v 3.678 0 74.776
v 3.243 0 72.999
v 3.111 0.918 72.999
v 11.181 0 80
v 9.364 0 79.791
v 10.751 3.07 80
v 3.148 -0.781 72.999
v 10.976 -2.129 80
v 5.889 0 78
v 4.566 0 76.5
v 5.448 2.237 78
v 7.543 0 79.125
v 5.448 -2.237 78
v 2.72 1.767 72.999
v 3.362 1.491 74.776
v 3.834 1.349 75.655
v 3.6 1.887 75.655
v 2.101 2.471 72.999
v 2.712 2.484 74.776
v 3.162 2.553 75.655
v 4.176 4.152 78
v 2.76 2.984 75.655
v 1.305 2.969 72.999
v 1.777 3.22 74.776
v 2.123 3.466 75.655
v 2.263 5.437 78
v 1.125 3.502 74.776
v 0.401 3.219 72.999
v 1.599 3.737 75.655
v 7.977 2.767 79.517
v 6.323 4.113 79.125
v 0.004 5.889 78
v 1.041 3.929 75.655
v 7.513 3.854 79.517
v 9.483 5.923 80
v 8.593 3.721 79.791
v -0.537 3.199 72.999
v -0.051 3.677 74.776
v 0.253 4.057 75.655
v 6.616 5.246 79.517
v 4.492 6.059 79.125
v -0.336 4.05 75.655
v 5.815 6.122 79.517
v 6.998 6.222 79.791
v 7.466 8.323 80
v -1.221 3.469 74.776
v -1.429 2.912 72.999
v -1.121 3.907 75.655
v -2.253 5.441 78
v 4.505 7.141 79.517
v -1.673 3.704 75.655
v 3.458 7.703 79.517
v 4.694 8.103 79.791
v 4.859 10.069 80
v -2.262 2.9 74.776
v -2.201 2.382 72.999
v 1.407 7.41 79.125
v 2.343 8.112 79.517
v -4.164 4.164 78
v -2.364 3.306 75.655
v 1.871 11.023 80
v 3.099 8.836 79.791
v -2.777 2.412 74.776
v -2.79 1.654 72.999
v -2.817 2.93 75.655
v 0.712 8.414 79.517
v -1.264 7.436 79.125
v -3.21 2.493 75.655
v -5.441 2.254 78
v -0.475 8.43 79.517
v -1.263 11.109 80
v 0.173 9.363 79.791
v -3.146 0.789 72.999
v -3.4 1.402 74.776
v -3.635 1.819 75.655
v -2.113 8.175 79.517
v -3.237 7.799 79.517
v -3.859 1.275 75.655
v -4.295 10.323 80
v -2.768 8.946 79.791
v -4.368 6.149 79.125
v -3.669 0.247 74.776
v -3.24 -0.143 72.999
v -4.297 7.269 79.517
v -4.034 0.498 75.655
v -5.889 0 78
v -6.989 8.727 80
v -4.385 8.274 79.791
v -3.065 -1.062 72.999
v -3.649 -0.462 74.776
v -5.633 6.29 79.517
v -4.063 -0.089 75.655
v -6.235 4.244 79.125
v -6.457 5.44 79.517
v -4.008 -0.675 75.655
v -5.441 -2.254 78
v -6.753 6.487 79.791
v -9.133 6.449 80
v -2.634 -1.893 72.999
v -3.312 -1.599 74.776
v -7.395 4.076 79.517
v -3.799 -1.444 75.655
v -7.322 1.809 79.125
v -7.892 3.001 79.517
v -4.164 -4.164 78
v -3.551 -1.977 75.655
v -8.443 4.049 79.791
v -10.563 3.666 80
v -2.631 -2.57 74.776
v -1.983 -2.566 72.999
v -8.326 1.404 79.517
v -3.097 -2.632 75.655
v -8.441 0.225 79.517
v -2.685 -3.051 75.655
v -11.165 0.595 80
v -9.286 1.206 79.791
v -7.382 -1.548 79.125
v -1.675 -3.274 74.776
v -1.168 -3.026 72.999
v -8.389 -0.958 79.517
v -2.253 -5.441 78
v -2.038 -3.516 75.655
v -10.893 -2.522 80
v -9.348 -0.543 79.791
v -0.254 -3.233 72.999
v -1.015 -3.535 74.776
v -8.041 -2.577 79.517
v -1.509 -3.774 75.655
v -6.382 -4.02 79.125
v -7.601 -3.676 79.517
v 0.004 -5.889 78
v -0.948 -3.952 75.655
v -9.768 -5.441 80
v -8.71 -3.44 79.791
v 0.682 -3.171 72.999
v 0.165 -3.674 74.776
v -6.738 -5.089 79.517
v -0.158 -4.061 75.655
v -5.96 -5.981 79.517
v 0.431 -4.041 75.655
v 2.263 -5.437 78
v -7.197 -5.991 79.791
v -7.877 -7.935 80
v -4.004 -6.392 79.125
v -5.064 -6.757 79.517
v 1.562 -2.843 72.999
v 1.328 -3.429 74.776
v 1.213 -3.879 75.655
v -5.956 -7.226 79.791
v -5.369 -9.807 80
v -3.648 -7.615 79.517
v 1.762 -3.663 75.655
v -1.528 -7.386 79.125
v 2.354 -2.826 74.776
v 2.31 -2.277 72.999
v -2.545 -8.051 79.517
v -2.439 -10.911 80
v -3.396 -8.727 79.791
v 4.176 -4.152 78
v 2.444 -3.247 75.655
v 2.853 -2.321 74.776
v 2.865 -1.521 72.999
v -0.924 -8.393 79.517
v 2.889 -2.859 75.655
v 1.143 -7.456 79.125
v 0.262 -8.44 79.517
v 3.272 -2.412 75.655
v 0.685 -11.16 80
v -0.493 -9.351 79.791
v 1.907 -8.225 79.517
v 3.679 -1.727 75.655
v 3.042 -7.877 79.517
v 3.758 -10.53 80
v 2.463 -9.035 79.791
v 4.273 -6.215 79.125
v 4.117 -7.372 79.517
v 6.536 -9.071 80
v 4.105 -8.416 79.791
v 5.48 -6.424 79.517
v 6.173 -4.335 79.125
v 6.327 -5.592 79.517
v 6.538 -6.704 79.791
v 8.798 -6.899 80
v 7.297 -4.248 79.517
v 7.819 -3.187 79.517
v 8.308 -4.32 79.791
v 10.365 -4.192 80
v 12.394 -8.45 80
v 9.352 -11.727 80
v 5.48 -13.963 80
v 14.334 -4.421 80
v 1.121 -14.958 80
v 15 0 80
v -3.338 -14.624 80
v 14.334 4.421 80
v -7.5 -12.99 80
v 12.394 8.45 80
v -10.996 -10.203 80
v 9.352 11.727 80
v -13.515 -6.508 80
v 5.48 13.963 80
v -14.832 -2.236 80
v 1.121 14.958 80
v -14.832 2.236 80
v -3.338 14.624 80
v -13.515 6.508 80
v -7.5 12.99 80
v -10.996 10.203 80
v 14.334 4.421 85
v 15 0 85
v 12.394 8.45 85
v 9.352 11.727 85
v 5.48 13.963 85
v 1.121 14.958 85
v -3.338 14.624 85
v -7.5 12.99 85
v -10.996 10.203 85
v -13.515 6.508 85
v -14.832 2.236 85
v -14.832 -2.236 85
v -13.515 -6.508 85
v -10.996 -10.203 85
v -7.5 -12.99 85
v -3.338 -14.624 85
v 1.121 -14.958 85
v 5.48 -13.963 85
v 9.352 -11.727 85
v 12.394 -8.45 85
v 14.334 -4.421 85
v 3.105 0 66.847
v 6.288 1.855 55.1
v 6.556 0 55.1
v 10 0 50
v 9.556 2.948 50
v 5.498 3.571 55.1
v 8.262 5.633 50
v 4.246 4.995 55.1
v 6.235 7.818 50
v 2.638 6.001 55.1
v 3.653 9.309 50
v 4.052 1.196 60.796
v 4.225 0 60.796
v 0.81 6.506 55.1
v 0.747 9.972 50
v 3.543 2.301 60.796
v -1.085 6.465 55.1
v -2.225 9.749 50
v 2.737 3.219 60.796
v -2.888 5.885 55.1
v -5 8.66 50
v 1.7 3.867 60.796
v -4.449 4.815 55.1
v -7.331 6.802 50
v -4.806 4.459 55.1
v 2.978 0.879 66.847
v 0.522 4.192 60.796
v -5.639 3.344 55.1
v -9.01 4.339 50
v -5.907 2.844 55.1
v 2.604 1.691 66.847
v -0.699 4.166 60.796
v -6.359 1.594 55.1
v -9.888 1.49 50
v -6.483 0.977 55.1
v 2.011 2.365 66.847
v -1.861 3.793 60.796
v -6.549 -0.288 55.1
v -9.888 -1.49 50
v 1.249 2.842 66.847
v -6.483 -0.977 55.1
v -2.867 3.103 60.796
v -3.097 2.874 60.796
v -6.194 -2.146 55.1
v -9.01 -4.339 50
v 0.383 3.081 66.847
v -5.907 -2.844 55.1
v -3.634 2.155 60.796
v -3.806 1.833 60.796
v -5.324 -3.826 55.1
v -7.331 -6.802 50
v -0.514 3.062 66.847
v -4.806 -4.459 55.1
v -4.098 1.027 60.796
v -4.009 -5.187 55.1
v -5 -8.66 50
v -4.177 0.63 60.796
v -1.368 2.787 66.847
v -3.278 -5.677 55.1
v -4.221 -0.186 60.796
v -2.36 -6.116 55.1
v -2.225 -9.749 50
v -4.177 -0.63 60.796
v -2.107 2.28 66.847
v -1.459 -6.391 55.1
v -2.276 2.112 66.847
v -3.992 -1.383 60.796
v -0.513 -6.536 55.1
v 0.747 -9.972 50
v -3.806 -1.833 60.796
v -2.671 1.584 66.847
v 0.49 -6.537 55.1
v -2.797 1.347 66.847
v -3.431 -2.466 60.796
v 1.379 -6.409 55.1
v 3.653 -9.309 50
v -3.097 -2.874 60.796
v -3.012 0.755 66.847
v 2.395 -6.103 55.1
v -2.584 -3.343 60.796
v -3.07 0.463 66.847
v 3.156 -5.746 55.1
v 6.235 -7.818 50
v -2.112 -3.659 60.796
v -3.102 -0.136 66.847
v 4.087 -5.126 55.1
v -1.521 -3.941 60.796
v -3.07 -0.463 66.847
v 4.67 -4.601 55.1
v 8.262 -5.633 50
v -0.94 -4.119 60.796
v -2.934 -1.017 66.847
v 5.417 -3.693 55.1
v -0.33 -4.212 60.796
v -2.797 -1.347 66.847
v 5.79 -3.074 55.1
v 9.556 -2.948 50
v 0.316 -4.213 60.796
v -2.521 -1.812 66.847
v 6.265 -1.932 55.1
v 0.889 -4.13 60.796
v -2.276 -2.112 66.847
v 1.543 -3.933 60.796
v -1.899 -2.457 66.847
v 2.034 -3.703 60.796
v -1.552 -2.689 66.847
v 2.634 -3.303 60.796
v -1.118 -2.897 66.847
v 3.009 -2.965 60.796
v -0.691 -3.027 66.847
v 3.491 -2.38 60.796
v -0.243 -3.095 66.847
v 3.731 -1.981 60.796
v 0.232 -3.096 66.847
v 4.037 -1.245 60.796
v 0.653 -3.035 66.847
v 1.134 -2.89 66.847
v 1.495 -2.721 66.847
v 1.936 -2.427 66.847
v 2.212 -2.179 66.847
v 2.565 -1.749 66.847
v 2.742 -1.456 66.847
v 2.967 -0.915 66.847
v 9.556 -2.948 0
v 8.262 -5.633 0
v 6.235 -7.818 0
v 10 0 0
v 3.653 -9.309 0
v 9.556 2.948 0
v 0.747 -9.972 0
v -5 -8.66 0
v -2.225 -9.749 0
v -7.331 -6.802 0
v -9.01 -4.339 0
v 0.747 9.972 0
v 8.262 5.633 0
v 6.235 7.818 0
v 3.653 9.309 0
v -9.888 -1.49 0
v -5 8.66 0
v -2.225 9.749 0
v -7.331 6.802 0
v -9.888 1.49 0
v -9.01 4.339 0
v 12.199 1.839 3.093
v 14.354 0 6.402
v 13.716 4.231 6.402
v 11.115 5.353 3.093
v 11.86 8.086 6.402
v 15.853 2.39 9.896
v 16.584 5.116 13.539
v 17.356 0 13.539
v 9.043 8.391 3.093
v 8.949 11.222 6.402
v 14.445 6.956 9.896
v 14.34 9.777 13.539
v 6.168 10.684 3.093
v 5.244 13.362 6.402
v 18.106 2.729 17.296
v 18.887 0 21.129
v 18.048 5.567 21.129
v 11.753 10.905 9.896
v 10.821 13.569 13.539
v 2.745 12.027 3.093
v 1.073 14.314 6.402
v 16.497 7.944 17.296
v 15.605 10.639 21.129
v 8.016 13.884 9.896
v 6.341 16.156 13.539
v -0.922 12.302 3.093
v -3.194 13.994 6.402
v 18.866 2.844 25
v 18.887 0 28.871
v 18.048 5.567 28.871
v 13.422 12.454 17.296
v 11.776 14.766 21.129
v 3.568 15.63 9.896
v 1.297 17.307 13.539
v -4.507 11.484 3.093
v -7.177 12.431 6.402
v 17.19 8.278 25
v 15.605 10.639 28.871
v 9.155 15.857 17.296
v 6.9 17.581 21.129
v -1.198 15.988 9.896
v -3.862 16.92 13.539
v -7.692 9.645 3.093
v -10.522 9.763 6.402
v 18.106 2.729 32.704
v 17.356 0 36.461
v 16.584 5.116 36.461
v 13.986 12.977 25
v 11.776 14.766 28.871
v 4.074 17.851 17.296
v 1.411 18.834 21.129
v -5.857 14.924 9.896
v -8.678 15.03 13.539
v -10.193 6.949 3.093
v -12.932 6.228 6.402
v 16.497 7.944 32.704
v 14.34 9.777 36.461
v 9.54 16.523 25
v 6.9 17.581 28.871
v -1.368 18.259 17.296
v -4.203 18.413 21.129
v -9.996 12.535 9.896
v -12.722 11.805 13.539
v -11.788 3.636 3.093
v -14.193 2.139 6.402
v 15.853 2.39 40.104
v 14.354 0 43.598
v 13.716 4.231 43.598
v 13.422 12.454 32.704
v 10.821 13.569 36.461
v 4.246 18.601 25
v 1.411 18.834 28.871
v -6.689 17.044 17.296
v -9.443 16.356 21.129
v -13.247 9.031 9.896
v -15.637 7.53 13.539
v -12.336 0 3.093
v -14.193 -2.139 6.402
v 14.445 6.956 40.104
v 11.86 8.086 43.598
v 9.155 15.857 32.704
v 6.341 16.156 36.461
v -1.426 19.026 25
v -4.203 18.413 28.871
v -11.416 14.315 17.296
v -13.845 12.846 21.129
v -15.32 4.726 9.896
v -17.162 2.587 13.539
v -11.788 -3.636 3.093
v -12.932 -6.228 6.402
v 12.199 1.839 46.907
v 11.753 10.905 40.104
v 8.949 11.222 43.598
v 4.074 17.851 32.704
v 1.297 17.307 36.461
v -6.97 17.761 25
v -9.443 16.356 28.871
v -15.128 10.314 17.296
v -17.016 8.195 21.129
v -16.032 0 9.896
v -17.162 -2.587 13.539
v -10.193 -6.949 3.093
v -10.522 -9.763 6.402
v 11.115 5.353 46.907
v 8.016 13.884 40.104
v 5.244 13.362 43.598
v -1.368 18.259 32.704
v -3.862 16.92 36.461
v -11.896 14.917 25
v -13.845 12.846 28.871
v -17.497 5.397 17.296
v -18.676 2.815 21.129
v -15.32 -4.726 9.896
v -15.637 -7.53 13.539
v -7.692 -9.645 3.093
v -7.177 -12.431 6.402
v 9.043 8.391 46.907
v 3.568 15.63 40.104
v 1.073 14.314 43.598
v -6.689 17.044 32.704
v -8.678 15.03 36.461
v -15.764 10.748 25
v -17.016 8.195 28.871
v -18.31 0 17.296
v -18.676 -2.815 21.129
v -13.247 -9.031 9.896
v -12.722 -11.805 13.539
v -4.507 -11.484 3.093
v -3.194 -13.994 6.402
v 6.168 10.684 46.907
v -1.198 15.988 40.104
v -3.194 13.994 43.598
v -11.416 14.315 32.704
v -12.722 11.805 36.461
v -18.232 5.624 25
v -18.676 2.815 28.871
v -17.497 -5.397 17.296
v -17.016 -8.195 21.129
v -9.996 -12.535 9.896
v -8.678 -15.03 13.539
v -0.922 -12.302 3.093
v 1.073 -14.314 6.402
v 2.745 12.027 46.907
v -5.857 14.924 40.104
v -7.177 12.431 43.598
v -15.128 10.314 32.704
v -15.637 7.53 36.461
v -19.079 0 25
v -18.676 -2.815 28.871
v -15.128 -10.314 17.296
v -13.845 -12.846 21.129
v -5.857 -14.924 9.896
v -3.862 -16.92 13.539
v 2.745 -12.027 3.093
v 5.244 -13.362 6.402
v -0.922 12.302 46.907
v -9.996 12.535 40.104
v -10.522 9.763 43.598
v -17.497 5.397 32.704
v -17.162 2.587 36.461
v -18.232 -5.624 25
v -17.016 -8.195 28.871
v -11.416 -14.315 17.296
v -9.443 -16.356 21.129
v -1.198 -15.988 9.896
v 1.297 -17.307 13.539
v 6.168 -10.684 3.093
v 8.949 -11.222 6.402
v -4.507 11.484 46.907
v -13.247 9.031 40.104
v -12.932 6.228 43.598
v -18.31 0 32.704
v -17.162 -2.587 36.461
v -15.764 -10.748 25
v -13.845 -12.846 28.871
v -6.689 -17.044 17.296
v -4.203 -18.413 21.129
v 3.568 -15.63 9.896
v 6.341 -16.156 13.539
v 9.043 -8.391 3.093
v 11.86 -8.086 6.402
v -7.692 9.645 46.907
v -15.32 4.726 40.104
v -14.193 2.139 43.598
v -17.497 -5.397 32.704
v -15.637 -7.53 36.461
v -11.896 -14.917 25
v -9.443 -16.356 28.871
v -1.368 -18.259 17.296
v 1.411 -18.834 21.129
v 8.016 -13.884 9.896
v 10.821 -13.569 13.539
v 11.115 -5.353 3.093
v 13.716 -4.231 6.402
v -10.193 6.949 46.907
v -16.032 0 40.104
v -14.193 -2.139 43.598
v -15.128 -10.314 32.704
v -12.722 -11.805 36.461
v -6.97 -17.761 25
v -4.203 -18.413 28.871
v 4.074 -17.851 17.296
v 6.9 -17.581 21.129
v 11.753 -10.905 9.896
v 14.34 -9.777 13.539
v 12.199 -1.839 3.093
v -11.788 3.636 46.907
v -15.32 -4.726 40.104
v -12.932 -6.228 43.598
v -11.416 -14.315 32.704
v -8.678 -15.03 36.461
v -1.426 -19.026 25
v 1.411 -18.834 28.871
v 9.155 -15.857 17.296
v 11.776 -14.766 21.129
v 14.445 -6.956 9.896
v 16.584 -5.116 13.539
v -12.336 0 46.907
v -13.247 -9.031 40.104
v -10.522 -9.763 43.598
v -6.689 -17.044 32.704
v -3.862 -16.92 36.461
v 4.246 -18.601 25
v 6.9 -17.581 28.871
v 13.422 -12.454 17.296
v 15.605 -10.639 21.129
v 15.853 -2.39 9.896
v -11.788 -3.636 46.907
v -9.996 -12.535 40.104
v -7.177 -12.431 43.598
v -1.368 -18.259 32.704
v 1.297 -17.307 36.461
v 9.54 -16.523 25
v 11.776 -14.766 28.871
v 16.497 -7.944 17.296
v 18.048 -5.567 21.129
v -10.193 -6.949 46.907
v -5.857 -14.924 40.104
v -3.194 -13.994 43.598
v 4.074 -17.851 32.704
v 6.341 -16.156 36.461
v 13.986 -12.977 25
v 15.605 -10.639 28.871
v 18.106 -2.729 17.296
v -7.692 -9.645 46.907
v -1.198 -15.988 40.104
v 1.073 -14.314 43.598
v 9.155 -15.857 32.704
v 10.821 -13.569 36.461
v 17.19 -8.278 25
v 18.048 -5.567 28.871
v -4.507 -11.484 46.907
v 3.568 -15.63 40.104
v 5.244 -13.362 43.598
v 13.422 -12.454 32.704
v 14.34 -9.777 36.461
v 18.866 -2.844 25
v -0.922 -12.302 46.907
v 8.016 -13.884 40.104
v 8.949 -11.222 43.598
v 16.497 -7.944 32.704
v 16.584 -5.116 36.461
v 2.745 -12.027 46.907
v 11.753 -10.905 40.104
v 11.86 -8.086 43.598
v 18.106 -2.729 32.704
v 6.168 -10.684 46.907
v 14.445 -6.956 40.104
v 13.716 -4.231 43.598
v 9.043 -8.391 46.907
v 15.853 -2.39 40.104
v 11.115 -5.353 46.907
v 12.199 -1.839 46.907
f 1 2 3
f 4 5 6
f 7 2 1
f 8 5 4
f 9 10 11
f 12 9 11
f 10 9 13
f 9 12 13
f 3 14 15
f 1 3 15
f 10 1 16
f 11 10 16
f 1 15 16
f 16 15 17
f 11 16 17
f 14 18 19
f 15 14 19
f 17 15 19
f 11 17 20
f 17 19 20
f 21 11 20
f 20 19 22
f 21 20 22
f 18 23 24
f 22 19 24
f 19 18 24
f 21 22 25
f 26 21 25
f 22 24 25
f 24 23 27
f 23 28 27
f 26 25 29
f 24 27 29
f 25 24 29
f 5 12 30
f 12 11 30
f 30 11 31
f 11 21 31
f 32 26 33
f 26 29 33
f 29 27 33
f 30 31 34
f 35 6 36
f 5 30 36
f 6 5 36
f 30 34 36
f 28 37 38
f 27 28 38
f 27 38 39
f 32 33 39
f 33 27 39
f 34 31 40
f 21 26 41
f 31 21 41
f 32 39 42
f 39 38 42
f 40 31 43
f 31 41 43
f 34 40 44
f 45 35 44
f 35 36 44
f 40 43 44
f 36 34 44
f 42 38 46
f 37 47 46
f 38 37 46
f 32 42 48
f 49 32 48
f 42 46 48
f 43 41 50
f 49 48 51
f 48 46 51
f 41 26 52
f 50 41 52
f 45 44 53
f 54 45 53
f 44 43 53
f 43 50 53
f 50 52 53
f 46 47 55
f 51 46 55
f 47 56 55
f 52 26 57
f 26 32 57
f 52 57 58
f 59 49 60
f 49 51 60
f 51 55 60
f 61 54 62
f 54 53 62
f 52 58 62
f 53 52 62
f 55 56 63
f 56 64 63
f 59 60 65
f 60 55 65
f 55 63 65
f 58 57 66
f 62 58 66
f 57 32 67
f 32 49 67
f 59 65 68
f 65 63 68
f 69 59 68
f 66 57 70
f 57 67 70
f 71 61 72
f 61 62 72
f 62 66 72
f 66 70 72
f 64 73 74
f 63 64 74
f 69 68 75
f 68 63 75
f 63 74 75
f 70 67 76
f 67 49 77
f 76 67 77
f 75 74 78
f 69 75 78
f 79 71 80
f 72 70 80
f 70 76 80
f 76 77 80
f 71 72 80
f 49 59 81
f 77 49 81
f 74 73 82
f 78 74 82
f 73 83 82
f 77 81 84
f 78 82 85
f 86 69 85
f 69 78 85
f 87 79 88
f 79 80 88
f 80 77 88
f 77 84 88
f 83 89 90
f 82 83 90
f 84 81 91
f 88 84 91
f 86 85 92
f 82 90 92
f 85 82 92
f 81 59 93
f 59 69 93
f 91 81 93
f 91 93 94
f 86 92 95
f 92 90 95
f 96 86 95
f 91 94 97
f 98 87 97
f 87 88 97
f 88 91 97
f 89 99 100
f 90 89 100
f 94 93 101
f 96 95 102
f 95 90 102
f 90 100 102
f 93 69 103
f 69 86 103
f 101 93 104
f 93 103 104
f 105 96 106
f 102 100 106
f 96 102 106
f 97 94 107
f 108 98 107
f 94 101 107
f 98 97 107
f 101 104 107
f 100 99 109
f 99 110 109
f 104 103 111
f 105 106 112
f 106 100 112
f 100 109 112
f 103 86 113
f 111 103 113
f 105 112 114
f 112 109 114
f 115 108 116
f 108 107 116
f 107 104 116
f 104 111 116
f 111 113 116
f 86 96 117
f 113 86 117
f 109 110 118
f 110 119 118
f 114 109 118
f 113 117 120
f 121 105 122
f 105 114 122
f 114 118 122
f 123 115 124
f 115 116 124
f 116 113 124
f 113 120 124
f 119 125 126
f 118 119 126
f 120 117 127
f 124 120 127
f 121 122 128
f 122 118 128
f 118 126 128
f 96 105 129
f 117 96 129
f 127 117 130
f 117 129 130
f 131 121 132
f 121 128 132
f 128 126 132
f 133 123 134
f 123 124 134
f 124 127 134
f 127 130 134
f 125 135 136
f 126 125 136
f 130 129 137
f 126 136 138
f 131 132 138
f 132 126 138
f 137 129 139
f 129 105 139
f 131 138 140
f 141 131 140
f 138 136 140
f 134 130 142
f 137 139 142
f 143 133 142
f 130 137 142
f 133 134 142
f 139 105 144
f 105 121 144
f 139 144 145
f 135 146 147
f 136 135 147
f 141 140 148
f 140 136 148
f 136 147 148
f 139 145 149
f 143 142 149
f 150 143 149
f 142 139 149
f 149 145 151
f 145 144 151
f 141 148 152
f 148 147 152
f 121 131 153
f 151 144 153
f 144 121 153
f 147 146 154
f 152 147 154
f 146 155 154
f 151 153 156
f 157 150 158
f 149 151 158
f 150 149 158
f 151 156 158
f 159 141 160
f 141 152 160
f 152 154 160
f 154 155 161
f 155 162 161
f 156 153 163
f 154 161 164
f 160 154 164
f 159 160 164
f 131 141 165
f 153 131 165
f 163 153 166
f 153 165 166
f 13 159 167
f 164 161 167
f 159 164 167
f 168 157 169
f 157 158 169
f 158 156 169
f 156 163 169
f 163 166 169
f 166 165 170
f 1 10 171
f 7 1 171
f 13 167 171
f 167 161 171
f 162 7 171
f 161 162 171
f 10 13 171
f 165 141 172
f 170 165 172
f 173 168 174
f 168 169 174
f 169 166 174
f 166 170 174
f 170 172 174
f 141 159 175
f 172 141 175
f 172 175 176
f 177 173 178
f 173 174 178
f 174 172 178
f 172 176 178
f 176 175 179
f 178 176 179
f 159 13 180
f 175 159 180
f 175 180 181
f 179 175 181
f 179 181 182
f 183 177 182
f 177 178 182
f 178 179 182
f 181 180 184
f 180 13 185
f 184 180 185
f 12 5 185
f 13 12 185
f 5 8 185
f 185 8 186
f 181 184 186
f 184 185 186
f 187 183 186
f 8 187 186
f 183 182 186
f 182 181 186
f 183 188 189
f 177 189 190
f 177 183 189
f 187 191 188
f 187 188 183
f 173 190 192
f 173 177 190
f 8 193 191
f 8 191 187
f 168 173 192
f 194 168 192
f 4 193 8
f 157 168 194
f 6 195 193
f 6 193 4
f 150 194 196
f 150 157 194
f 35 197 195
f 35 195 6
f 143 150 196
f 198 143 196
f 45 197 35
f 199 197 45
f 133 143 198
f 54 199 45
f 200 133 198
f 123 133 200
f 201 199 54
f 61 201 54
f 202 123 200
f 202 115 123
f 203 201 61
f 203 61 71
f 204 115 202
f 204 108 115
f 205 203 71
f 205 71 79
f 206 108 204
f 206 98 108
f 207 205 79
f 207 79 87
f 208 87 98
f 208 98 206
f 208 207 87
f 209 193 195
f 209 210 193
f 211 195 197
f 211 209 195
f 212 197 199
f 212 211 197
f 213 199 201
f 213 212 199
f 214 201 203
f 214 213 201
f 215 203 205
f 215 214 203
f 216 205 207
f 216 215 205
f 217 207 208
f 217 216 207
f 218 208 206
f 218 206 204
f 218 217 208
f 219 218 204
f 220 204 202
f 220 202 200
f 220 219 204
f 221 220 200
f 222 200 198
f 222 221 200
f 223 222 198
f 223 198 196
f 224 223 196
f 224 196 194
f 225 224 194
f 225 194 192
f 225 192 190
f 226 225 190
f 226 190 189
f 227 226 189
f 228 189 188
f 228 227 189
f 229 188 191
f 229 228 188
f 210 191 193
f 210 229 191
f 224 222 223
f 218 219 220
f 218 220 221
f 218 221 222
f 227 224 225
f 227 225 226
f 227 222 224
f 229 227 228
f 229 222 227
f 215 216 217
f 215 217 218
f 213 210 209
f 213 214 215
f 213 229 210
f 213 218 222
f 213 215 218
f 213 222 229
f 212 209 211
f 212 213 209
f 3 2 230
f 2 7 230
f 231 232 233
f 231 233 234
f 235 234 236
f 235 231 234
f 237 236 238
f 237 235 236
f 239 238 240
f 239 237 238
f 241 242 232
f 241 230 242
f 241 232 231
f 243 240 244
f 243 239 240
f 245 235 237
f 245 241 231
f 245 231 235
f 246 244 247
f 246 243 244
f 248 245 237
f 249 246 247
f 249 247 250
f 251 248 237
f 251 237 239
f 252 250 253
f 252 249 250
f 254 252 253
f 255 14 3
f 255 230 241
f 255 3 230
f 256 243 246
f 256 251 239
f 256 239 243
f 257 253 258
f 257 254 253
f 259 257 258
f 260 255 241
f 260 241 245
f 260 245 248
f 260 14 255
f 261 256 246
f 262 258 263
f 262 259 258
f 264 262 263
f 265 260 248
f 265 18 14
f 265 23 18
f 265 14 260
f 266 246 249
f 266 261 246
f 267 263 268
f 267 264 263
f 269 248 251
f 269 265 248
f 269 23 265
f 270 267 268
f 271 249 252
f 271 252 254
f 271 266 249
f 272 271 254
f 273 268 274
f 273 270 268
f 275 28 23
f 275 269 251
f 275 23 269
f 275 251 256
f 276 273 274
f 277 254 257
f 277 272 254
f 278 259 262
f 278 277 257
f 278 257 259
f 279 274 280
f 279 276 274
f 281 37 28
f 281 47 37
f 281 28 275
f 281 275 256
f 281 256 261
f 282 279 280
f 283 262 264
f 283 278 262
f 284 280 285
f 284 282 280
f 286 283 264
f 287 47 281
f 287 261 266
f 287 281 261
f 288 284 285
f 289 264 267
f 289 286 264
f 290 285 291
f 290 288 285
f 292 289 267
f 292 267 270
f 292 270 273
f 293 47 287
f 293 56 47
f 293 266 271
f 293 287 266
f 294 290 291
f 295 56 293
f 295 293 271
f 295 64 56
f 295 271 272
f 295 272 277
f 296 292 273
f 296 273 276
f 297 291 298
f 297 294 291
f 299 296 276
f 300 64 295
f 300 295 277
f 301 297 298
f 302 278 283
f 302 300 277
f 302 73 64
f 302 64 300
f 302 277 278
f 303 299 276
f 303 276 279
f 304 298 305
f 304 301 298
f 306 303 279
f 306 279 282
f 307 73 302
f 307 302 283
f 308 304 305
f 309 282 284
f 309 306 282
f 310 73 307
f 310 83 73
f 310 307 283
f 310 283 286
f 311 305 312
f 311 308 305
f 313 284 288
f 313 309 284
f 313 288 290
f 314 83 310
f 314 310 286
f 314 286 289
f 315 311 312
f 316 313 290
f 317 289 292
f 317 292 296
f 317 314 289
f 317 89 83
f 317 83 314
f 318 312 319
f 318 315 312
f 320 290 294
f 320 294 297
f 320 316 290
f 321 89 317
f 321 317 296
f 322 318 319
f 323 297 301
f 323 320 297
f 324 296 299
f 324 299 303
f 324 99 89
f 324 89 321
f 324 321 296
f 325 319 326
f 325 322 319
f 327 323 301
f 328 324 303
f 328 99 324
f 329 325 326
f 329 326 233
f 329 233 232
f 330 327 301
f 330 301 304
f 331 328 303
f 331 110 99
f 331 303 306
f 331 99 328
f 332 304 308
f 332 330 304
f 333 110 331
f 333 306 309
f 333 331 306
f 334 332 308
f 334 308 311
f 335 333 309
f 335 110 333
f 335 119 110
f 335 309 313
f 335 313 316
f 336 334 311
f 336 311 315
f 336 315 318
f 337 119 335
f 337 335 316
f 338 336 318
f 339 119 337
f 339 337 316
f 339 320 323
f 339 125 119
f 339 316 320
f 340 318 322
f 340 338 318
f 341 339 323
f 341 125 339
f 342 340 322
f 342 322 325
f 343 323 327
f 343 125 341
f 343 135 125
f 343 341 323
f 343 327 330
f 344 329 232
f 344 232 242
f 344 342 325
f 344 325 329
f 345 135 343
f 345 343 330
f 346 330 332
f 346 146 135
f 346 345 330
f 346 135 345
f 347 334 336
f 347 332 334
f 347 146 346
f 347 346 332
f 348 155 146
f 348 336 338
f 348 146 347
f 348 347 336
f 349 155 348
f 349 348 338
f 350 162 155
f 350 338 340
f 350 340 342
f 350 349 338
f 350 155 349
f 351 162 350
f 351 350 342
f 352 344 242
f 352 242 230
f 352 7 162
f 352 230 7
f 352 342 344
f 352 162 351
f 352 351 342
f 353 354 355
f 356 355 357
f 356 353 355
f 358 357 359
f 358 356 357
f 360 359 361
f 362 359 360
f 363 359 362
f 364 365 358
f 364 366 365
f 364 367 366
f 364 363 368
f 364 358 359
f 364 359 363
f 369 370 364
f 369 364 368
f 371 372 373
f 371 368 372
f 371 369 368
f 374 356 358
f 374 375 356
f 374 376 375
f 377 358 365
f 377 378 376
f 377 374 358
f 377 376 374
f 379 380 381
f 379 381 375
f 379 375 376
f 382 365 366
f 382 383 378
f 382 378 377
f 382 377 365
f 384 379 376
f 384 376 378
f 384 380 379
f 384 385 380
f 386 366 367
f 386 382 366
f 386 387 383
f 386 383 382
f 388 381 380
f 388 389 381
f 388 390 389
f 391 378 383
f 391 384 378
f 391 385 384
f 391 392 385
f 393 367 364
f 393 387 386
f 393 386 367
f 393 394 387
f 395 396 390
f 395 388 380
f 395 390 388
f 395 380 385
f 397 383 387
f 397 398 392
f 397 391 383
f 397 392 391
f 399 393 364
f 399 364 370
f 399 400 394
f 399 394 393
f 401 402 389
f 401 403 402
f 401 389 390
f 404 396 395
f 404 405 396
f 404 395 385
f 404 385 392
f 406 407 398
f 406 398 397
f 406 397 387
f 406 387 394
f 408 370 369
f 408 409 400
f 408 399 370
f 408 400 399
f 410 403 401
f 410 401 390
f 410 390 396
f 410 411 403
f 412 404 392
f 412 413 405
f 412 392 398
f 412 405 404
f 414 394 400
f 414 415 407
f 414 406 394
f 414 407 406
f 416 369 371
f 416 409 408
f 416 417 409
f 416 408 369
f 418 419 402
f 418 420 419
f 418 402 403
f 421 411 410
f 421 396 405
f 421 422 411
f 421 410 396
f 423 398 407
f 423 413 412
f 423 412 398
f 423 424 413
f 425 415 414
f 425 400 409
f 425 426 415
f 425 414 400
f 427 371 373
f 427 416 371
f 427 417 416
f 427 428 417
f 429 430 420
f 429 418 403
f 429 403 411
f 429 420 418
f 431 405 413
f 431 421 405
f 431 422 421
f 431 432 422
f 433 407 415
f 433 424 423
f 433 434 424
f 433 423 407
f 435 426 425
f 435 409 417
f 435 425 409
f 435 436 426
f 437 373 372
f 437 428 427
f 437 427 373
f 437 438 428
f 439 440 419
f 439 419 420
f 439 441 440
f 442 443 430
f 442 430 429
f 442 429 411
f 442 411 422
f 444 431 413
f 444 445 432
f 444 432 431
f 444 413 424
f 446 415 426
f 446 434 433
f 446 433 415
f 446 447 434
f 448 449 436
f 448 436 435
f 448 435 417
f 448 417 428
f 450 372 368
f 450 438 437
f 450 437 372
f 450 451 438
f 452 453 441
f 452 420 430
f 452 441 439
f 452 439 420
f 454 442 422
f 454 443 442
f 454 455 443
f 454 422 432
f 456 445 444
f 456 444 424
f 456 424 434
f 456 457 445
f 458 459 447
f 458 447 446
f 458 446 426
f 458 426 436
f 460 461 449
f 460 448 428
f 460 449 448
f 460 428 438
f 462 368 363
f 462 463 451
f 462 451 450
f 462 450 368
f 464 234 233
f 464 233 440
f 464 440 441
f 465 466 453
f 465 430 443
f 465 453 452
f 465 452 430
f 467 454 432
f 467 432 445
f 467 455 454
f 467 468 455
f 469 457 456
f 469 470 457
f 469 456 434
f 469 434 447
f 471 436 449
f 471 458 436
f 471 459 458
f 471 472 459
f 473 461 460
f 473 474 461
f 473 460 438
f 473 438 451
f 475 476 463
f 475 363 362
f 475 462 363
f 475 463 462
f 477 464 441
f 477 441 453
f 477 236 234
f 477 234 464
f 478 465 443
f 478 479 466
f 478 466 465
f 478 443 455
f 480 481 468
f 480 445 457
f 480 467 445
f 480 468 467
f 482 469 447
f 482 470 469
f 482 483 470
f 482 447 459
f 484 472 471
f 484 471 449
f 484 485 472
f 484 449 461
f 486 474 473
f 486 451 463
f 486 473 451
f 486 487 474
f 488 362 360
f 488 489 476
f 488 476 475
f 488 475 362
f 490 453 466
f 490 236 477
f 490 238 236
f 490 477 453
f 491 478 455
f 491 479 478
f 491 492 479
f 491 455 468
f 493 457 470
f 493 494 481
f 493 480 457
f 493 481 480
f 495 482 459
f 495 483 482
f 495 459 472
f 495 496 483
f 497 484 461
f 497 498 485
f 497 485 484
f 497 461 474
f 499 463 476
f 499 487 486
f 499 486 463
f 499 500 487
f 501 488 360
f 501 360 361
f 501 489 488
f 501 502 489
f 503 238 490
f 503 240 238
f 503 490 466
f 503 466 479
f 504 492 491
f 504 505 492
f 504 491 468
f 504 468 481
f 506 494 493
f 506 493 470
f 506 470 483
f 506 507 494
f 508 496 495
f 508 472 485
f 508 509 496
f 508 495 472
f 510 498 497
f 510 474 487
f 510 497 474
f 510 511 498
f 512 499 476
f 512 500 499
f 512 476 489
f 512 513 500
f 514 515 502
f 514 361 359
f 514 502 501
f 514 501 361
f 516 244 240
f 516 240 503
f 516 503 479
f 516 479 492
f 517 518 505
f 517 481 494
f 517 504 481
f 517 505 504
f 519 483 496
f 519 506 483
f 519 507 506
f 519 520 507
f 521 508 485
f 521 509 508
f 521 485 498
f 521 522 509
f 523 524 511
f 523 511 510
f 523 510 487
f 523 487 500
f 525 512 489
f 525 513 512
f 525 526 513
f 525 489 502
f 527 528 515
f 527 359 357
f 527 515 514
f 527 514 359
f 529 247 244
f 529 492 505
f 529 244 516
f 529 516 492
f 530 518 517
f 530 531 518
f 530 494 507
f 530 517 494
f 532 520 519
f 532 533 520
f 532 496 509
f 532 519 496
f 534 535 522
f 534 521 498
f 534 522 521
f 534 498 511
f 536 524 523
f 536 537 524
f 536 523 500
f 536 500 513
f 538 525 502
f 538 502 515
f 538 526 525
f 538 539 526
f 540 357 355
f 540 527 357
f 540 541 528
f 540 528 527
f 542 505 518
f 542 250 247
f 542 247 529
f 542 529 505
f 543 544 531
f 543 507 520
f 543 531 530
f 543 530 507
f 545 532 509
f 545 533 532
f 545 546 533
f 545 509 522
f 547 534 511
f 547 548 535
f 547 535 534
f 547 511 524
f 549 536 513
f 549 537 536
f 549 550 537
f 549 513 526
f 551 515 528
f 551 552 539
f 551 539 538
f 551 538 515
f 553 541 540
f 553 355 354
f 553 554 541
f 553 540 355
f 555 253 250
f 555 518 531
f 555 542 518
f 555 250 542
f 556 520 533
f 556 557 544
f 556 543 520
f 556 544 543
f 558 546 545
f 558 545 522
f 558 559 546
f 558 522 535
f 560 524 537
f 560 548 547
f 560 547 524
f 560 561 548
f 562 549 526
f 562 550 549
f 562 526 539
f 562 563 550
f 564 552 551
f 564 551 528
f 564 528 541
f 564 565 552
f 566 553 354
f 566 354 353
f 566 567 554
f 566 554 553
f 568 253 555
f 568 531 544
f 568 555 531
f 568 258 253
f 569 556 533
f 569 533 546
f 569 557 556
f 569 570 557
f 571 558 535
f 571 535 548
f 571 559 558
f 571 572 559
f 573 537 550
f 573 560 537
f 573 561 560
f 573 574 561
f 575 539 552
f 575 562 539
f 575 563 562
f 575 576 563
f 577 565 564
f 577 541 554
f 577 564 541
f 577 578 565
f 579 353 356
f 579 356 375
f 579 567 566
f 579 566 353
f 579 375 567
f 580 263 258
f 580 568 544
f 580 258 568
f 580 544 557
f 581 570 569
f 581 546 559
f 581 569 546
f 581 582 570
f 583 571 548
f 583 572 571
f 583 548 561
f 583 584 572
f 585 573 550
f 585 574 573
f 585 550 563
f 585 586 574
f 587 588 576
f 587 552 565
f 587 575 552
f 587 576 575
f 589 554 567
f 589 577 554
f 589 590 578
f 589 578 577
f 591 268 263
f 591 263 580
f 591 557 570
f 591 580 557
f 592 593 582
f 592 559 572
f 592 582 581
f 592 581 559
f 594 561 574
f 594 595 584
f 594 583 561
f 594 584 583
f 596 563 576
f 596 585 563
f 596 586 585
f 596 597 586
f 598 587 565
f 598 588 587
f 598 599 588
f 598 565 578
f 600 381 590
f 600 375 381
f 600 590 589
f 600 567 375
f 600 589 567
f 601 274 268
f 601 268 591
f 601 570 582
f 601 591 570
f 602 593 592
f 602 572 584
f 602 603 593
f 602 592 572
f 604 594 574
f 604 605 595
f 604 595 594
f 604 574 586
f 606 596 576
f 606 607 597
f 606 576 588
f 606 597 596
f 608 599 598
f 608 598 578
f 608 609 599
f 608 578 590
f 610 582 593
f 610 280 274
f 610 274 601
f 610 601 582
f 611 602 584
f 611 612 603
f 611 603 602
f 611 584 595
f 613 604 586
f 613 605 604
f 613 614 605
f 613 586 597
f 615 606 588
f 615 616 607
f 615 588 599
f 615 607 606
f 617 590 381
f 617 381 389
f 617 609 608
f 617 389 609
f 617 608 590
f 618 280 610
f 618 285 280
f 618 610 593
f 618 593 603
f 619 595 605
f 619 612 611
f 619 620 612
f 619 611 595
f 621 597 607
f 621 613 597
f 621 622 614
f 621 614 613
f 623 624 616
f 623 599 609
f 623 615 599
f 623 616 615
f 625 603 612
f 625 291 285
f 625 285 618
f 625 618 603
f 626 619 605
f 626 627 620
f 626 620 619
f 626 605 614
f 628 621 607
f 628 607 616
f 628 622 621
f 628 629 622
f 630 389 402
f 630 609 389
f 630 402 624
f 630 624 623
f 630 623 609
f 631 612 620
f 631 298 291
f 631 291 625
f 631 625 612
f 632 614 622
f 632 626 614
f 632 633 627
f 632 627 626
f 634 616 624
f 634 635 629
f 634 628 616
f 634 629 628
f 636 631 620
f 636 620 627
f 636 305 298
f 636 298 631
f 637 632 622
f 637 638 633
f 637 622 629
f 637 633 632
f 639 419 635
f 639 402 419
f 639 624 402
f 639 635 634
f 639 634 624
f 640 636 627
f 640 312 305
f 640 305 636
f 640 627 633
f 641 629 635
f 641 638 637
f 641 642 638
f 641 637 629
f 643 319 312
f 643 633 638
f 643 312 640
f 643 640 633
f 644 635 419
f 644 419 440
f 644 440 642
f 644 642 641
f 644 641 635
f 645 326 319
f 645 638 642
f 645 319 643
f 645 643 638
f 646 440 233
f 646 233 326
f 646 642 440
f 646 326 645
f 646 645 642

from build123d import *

# Parameters (mm, degrees)
F2_R = 8


with BuildPart() as f1:
    # F0 (on Front) → F1 (revolve)
    with BuildSketch(Plane.XZ):
        with BuildLine():
            Line((0, 80), (0, 0))
            Line((0, 0), (10, 0))
            ThreePointArc((10, 0), (19.079415133, 25), (10, 50))
            ThreePointArc((10, 50), (3.4165275014, 64.3194212502), (5, 80))
            Line((5, 80), (15, 80))
            Line((15, 80), (15, 85))
            Line((15, 85), (0, 85))
            Line((0, 85), (0, 80))
        make_face()
    revolve(axis=Axis((0, 0, 40), (0, 0, 1)))

    # F2
    f2_edges = [f1.edges().sort_by_distance(p)[0] for p in [
        (-5, 0, 80),
    ]]
    fillet(f2_edges, radius=F2_R)


solid = f1.part
